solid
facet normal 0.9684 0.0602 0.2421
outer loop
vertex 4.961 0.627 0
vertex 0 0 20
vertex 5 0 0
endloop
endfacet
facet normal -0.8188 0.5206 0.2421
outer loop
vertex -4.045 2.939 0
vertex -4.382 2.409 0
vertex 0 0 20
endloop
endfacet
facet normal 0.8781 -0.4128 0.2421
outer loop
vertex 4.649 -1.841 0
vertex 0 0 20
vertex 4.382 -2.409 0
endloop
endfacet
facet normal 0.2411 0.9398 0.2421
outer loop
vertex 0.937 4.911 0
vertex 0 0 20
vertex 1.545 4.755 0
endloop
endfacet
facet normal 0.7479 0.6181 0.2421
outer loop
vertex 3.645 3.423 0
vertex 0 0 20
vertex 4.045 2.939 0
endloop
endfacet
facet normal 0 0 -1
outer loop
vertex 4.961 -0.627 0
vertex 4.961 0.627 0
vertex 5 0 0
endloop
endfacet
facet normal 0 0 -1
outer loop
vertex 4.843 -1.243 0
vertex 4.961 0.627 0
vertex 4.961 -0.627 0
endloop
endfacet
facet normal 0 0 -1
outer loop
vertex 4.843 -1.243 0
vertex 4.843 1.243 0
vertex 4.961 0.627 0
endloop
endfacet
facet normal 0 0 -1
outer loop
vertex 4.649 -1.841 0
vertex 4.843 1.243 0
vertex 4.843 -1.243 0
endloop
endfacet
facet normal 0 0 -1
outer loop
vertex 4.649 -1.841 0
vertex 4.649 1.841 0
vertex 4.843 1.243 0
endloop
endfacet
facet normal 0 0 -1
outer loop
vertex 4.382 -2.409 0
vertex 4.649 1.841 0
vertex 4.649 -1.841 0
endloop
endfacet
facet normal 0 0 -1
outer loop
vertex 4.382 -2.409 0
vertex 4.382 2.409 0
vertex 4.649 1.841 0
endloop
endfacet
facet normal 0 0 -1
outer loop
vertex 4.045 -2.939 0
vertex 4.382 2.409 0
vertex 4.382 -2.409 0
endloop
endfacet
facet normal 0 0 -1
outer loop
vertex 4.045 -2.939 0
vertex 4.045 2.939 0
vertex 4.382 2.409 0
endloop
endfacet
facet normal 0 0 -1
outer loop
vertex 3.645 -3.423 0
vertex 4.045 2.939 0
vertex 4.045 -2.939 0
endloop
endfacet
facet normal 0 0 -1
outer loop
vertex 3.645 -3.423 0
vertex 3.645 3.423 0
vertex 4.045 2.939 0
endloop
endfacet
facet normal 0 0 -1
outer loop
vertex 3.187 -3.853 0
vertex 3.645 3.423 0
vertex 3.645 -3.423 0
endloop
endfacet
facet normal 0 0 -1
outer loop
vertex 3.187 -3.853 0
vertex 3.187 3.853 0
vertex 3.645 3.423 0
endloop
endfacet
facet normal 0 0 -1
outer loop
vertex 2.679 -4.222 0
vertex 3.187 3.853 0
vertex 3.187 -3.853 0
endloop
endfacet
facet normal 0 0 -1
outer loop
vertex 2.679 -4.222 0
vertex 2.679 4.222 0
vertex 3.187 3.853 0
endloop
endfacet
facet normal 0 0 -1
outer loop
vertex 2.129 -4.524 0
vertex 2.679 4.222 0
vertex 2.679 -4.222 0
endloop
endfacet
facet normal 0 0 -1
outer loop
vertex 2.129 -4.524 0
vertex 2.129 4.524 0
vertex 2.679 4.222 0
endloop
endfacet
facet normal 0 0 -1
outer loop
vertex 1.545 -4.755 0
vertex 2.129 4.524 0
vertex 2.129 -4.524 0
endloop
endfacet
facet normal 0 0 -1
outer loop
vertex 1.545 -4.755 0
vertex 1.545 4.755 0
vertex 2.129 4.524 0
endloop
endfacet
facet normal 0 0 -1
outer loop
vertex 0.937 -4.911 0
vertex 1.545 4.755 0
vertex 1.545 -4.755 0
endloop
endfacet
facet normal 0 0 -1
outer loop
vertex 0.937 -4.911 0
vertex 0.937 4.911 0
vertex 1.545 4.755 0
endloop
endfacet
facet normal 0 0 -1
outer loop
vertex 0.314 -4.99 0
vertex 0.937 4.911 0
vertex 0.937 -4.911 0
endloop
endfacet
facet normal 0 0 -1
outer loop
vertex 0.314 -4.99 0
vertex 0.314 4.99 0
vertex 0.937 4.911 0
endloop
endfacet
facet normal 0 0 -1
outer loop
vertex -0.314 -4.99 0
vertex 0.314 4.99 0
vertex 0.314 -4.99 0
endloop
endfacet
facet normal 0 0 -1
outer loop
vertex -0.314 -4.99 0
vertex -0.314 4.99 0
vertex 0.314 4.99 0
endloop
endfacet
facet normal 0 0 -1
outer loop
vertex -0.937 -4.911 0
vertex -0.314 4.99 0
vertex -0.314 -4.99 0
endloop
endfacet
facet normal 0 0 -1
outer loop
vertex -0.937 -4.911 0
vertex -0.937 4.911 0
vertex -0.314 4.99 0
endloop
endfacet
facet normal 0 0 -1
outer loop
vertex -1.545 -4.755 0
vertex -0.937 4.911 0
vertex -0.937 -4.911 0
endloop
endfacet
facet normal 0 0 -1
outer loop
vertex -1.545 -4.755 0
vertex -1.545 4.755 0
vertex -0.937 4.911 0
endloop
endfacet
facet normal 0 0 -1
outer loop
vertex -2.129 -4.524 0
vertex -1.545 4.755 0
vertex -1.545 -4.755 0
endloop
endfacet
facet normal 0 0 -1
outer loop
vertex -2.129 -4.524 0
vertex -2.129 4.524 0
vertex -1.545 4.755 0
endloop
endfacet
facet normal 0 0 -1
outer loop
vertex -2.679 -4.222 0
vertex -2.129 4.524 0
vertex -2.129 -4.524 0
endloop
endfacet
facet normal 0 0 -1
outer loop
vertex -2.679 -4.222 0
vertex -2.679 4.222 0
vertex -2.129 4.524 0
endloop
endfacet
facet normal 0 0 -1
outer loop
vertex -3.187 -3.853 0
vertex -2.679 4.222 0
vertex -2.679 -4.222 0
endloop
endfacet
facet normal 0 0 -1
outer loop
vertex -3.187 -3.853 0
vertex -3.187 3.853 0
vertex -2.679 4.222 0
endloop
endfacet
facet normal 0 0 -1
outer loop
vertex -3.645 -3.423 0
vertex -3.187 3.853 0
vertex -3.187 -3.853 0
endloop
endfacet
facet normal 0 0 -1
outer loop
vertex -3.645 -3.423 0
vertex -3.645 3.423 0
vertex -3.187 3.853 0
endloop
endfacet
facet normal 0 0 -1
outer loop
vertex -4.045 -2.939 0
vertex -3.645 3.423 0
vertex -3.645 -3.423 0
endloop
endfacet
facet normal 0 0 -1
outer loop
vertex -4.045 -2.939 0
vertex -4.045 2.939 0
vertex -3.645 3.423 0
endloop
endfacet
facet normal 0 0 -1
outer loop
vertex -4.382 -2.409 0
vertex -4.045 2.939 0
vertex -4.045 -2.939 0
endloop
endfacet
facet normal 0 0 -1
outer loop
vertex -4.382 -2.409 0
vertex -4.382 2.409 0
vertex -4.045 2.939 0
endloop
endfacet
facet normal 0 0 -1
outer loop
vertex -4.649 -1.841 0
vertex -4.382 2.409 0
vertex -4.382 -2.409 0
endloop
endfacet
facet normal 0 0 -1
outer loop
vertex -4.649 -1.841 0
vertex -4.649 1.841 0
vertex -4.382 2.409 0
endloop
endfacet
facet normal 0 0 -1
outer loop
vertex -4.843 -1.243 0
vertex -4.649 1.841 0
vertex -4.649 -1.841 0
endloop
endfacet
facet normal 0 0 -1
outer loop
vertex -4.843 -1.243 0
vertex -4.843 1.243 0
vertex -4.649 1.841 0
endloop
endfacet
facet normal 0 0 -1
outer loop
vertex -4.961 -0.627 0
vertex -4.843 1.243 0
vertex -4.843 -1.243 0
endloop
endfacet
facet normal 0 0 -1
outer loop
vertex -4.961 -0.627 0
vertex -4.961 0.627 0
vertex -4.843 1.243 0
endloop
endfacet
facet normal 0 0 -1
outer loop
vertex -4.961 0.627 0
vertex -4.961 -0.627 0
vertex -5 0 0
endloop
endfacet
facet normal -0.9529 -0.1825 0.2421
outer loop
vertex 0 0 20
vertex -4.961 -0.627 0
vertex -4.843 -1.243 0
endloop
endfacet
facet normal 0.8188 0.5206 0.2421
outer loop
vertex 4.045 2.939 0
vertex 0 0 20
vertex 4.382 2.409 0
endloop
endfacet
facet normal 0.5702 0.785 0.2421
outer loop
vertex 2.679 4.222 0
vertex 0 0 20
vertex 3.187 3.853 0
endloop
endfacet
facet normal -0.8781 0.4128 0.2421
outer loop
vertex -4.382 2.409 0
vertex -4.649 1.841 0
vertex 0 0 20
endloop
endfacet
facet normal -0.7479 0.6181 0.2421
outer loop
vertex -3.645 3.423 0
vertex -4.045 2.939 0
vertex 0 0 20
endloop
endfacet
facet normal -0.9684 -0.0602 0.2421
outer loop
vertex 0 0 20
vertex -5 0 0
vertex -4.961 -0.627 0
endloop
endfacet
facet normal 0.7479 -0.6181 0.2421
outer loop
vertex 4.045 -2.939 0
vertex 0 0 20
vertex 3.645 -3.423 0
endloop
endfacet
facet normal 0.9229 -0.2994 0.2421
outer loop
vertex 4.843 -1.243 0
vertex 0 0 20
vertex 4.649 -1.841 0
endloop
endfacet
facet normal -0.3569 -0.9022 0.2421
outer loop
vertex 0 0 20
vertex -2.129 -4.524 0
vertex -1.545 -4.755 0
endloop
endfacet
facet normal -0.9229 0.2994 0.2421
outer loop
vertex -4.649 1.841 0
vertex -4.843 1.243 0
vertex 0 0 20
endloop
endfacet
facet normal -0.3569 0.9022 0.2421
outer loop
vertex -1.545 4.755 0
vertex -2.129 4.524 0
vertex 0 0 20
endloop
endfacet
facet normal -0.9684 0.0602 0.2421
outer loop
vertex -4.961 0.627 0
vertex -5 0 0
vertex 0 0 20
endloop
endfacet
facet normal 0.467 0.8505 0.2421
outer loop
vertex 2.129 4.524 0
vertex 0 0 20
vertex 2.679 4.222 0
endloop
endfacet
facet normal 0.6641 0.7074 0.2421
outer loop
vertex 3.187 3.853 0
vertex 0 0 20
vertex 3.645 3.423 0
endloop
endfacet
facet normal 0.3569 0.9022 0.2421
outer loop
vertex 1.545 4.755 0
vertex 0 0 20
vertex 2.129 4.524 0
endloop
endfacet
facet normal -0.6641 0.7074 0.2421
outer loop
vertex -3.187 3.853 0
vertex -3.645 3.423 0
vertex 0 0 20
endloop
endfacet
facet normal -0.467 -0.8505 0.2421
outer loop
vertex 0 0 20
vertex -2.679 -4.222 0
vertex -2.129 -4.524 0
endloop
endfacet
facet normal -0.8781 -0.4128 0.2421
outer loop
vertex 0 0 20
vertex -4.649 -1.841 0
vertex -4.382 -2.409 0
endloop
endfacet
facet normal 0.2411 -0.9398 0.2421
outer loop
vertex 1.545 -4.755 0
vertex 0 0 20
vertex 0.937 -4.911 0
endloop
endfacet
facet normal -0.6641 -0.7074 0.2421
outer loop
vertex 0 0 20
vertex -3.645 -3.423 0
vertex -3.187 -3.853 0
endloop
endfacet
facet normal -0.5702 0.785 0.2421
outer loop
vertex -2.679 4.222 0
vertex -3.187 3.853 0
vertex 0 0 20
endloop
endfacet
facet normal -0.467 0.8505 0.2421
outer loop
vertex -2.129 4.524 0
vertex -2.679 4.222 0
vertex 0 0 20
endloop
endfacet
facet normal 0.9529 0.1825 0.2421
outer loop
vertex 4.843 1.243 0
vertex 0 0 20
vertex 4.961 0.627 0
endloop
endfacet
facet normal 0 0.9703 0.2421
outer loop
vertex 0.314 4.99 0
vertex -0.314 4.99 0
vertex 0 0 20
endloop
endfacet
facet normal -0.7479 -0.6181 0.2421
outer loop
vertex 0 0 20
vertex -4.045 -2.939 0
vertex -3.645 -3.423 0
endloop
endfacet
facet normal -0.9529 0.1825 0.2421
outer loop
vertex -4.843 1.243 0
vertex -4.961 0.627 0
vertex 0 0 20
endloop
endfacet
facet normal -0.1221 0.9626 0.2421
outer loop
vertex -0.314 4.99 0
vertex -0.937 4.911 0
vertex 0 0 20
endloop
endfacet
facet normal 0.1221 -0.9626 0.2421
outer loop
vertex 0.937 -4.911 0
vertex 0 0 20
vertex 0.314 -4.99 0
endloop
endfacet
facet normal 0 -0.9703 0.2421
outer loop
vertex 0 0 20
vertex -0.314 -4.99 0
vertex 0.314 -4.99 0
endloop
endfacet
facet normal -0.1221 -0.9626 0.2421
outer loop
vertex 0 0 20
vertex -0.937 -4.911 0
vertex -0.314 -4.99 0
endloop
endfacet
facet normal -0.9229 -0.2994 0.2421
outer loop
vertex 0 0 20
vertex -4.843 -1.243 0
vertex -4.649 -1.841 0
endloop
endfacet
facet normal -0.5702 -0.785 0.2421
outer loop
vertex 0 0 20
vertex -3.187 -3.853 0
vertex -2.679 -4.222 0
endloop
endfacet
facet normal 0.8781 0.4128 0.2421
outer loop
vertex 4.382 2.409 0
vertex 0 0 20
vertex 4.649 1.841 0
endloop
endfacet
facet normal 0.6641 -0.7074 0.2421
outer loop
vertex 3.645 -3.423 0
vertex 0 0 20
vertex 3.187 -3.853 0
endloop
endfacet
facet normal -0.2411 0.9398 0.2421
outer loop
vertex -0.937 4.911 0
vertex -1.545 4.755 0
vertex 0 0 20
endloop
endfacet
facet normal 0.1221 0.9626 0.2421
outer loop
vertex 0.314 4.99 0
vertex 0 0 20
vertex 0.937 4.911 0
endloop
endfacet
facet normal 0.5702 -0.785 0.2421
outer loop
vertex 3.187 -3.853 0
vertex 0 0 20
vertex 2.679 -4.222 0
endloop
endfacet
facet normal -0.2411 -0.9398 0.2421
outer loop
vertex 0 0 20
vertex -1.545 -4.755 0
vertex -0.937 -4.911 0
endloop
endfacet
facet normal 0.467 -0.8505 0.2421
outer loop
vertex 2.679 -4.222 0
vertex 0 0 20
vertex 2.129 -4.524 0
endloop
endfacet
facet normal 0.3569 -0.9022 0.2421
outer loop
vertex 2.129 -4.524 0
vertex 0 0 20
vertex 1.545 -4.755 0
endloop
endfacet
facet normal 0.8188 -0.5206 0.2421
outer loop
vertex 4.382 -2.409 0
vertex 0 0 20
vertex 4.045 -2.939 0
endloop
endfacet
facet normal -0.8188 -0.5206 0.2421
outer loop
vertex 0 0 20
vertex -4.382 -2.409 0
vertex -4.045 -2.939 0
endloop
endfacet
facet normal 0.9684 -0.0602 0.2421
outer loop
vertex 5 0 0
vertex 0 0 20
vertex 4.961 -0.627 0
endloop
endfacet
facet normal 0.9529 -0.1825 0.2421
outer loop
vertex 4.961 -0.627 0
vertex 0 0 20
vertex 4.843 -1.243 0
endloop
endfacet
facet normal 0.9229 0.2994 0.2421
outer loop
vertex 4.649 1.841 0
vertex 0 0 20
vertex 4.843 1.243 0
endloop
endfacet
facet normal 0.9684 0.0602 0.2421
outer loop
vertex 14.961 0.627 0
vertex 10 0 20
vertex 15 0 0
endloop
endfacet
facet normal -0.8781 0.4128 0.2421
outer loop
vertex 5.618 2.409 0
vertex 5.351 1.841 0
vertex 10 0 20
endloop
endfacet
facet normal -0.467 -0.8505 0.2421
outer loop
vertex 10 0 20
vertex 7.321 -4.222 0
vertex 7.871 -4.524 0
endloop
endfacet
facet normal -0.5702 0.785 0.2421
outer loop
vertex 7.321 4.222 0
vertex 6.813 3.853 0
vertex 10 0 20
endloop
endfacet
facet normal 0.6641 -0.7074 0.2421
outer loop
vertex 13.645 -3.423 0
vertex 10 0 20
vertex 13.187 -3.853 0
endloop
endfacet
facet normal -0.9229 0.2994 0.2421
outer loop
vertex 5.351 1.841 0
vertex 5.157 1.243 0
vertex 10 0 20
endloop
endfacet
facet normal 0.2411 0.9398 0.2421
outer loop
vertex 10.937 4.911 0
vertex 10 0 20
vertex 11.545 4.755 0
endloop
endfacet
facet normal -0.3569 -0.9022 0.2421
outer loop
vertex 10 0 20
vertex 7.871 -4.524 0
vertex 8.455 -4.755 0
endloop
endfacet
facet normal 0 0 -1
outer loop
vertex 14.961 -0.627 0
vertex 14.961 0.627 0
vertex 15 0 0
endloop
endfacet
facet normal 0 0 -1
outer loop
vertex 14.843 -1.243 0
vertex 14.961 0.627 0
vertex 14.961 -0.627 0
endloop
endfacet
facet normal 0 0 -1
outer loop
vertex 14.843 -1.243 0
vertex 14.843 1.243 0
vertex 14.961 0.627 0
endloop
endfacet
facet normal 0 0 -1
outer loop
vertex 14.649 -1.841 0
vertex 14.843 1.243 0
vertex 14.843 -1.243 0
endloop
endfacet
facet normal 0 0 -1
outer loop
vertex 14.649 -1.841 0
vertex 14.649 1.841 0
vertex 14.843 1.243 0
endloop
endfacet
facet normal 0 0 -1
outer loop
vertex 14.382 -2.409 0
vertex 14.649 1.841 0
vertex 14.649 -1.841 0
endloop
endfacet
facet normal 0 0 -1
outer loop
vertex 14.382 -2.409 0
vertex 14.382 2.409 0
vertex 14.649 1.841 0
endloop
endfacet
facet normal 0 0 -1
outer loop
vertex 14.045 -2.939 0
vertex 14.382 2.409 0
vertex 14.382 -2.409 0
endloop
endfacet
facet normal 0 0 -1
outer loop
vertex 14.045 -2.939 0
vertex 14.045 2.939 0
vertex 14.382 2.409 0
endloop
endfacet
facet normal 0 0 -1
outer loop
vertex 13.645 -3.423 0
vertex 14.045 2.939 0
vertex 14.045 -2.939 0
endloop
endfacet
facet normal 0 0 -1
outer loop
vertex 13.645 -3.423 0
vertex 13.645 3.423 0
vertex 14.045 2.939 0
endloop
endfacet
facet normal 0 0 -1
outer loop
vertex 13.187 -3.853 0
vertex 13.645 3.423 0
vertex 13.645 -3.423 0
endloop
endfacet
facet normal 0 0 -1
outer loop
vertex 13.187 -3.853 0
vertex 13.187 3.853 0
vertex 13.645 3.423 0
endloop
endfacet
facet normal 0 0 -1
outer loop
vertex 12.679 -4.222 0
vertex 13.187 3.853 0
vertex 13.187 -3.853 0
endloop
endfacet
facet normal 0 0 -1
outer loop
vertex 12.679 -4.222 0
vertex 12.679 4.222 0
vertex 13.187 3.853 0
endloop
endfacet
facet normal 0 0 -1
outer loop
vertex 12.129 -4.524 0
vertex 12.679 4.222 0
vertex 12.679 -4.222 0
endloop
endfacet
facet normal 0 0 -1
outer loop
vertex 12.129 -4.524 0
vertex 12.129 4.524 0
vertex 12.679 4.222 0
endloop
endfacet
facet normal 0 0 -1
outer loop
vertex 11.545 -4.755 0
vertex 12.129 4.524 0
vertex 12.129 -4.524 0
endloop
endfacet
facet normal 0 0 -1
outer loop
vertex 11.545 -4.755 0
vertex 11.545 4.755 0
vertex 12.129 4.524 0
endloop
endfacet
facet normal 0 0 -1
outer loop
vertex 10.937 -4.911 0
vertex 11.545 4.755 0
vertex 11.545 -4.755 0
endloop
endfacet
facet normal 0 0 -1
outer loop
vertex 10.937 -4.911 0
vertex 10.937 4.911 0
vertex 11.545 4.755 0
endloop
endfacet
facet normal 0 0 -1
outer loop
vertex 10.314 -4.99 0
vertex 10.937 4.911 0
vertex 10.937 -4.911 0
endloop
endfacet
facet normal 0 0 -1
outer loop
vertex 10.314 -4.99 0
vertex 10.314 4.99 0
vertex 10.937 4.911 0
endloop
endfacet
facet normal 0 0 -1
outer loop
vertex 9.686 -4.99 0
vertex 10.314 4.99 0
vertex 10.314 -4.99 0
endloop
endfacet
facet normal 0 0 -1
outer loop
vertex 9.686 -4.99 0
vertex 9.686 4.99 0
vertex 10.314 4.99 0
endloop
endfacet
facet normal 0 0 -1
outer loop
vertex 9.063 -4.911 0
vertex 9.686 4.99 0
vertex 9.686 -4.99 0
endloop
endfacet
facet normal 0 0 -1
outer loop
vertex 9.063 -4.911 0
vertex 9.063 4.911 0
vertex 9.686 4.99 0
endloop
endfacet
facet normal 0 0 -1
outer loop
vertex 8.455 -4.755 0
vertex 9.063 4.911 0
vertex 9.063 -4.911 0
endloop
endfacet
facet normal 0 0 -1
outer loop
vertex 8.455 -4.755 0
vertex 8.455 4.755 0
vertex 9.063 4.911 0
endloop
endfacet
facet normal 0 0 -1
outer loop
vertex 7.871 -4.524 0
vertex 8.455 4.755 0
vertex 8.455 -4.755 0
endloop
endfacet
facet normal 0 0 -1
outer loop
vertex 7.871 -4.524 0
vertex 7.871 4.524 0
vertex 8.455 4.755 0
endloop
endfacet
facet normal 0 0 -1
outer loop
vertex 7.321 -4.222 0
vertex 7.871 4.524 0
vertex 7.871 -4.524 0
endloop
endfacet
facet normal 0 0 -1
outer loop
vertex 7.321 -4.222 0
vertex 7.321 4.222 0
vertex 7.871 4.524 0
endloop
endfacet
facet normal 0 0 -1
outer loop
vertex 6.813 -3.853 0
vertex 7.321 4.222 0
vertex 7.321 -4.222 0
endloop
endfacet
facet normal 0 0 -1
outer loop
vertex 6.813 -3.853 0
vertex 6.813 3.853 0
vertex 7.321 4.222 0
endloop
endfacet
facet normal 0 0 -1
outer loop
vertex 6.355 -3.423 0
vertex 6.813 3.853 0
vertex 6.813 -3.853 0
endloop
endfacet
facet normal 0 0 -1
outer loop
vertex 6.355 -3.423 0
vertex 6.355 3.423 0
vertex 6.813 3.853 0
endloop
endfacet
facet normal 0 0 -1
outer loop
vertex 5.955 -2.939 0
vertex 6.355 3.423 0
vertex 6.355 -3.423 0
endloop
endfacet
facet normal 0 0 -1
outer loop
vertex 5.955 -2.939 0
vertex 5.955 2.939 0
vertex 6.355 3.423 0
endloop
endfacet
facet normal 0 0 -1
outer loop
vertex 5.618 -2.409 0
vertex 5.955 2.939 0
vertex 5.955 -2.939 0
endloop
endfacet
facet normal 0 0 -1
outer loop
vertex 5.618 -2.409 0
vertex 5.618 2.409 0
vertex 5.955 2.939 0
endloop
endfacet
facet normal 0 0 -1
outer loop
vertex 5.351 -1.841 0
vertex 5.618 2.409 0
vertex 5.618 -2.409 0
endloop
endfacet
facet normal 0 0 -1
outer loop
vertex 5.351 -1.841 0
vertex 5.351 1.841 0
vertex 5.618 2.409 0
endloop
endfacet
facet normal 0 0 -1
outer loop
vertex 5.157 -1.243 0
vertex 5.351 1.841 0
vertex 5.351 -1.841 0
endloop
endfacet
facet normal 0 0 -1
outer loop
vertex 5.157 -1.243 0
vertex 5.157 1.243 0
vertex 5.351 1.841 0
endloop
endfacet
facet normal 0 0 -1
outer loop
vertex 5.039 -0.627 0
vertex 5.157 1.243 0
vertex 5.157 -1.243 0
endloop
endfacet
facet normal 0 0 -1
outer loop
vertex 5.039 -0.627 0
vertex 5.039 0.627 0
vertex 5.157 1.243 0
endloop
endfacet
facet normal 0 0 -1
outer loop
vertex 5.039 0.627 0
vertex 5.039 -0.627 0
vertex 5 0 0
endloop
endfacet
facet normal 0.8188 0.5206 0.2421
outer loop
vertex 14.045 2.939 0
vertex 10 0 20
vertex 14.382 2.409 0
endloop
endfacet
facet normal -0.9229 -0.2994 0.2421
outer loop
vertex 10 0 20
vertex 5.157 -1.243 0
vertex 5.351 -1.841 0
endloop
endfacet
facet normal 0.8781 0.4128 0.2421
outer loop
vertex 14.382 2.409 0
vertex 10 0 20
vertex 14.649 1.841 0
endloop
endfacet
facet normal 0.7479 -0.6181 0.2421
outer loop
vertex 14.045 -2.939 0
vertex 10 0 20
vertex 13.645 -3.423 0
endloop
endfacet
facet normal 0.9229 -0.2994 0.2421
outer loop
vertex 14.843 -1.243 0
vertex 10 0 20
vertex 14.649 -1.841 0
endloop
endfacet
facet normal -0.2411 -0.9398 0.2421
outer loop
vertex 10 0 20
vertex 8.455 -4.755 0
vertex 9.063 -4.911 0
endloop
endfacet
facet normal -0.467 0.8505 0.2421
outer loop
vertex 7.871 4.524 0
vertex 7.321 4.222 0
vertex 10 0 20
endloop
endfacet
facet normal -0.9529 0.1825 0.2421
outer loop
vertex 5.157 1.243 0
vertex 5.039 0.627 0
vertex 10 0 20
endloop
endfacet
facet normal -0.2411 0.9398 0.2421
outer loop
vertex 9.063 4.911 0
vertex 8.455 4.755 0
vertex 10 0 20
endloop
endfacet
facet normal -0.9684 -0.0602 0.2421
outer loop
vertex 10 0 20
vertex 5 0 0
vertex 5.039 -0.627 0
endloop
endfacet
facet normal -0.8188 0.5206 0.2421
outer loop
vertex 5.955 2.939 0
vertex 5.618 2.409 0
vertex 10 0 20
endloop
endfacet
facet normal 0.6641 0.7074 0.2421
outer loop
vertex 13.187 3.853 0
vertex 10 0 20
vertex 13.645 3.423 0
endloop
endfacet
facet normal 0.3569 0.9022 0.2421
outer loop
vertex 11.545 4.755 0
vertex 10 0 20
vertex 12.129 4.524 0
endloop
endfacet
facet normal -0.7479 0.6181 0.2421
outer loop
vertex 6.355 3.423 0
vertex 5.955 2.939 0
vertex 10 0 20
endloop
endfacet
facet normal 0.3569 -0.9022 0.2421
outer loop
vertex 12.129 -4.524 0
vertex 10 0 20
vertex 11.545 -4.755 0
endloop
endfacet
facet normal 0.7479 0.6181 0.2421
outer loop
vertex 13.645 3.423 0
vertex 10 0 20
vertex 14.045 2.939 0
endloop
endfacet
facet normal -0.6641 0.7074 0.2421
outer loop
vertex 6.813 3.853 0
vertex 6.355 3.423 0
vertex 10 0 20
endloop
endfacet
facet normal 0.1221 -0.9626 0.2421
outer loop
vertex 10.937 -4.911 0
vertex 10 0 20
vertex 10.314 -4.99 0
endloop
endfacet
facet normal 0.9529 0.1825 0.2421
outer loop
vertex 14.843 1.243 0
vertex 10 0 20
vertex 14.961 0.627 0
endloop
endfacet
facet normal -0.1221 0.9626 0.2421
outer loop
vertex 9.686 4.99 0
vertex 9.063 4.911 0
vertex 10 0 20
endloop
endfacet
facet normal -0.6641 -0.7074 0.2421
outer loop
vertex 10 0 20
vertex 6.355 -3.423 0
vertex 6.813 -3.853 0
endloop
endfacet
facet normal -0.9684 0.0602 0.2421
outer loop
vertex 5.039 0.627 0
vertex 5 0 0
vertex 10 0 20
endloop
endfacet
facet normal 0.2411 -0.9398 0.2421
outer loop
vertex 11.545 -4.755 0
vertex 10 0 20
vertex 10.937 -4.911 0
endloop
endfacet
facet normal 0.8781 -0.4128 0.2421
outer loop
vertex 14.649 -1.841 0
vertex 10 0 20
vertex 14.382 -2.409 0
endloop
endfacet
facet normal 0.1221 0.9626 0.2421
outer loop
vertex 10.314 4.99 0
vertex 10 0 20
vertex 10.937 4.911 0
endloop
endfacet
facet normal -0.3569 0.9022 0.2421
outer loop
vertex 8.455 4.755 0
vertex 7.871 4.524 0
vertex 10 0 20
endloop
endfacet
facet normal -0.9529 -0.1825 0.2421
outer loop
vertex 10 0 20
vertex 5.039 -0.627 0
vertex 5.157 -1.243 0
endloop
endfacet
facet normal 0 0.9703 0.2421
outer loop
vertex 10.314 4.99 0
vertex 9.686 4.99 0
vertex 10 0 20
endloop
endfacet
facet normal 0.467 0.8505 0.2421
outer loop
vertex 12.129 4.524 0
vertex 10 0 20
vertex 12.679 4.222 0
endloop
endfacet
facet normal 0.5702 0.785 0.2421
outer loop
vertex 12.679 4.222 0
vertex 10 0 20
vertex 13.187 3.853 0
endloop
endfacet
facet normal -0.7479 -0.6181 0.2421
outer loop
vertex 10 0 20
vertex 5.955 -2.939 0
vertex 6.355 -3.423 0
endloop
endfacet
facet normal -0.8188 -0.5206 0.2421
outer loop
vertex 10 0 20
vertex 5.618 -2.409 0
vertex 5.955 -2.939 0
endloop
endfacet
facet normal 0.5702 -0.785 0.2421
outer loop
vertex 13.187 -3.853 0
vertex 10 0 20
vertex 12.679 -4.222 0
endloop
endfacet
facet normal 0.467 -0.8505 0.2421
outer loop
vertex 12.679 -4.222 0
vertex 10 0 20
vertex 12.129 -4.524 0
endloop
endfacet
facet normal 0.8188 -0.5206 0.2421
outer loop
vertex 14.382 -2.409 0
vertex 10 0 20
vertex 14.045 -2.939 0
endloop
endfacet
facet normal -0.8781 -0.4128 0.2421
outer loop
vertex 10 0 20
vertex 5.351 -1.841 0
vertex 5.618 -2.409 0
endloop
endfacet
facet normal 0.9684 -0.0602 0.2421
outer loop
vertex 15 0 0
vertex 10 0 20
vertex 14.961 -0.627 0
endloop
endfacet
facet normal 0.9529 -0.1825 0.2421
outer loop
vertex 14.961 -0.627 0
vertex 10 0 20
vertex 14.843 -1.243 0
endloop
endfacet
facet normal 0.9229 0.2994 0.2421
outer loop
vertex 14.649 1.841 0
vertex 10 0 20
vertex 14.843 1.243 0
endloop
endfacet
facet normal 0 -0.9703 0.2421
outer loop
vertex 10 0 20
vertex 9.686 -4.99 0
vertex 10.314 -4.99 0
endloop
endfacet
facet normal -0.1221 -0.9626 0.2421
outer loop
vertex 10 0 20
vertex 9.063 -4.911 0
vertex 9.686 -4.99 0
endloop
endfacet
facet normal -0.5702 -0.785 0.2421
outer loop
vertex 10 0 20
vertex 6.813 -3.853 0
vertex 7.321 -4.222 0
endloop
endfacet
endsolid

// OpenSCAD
$fn=50;
cylinder(h=20, r1=5, r2=0);
translate([10, 0, 0]) cylinder(h=20, r1=5, r2=0);
